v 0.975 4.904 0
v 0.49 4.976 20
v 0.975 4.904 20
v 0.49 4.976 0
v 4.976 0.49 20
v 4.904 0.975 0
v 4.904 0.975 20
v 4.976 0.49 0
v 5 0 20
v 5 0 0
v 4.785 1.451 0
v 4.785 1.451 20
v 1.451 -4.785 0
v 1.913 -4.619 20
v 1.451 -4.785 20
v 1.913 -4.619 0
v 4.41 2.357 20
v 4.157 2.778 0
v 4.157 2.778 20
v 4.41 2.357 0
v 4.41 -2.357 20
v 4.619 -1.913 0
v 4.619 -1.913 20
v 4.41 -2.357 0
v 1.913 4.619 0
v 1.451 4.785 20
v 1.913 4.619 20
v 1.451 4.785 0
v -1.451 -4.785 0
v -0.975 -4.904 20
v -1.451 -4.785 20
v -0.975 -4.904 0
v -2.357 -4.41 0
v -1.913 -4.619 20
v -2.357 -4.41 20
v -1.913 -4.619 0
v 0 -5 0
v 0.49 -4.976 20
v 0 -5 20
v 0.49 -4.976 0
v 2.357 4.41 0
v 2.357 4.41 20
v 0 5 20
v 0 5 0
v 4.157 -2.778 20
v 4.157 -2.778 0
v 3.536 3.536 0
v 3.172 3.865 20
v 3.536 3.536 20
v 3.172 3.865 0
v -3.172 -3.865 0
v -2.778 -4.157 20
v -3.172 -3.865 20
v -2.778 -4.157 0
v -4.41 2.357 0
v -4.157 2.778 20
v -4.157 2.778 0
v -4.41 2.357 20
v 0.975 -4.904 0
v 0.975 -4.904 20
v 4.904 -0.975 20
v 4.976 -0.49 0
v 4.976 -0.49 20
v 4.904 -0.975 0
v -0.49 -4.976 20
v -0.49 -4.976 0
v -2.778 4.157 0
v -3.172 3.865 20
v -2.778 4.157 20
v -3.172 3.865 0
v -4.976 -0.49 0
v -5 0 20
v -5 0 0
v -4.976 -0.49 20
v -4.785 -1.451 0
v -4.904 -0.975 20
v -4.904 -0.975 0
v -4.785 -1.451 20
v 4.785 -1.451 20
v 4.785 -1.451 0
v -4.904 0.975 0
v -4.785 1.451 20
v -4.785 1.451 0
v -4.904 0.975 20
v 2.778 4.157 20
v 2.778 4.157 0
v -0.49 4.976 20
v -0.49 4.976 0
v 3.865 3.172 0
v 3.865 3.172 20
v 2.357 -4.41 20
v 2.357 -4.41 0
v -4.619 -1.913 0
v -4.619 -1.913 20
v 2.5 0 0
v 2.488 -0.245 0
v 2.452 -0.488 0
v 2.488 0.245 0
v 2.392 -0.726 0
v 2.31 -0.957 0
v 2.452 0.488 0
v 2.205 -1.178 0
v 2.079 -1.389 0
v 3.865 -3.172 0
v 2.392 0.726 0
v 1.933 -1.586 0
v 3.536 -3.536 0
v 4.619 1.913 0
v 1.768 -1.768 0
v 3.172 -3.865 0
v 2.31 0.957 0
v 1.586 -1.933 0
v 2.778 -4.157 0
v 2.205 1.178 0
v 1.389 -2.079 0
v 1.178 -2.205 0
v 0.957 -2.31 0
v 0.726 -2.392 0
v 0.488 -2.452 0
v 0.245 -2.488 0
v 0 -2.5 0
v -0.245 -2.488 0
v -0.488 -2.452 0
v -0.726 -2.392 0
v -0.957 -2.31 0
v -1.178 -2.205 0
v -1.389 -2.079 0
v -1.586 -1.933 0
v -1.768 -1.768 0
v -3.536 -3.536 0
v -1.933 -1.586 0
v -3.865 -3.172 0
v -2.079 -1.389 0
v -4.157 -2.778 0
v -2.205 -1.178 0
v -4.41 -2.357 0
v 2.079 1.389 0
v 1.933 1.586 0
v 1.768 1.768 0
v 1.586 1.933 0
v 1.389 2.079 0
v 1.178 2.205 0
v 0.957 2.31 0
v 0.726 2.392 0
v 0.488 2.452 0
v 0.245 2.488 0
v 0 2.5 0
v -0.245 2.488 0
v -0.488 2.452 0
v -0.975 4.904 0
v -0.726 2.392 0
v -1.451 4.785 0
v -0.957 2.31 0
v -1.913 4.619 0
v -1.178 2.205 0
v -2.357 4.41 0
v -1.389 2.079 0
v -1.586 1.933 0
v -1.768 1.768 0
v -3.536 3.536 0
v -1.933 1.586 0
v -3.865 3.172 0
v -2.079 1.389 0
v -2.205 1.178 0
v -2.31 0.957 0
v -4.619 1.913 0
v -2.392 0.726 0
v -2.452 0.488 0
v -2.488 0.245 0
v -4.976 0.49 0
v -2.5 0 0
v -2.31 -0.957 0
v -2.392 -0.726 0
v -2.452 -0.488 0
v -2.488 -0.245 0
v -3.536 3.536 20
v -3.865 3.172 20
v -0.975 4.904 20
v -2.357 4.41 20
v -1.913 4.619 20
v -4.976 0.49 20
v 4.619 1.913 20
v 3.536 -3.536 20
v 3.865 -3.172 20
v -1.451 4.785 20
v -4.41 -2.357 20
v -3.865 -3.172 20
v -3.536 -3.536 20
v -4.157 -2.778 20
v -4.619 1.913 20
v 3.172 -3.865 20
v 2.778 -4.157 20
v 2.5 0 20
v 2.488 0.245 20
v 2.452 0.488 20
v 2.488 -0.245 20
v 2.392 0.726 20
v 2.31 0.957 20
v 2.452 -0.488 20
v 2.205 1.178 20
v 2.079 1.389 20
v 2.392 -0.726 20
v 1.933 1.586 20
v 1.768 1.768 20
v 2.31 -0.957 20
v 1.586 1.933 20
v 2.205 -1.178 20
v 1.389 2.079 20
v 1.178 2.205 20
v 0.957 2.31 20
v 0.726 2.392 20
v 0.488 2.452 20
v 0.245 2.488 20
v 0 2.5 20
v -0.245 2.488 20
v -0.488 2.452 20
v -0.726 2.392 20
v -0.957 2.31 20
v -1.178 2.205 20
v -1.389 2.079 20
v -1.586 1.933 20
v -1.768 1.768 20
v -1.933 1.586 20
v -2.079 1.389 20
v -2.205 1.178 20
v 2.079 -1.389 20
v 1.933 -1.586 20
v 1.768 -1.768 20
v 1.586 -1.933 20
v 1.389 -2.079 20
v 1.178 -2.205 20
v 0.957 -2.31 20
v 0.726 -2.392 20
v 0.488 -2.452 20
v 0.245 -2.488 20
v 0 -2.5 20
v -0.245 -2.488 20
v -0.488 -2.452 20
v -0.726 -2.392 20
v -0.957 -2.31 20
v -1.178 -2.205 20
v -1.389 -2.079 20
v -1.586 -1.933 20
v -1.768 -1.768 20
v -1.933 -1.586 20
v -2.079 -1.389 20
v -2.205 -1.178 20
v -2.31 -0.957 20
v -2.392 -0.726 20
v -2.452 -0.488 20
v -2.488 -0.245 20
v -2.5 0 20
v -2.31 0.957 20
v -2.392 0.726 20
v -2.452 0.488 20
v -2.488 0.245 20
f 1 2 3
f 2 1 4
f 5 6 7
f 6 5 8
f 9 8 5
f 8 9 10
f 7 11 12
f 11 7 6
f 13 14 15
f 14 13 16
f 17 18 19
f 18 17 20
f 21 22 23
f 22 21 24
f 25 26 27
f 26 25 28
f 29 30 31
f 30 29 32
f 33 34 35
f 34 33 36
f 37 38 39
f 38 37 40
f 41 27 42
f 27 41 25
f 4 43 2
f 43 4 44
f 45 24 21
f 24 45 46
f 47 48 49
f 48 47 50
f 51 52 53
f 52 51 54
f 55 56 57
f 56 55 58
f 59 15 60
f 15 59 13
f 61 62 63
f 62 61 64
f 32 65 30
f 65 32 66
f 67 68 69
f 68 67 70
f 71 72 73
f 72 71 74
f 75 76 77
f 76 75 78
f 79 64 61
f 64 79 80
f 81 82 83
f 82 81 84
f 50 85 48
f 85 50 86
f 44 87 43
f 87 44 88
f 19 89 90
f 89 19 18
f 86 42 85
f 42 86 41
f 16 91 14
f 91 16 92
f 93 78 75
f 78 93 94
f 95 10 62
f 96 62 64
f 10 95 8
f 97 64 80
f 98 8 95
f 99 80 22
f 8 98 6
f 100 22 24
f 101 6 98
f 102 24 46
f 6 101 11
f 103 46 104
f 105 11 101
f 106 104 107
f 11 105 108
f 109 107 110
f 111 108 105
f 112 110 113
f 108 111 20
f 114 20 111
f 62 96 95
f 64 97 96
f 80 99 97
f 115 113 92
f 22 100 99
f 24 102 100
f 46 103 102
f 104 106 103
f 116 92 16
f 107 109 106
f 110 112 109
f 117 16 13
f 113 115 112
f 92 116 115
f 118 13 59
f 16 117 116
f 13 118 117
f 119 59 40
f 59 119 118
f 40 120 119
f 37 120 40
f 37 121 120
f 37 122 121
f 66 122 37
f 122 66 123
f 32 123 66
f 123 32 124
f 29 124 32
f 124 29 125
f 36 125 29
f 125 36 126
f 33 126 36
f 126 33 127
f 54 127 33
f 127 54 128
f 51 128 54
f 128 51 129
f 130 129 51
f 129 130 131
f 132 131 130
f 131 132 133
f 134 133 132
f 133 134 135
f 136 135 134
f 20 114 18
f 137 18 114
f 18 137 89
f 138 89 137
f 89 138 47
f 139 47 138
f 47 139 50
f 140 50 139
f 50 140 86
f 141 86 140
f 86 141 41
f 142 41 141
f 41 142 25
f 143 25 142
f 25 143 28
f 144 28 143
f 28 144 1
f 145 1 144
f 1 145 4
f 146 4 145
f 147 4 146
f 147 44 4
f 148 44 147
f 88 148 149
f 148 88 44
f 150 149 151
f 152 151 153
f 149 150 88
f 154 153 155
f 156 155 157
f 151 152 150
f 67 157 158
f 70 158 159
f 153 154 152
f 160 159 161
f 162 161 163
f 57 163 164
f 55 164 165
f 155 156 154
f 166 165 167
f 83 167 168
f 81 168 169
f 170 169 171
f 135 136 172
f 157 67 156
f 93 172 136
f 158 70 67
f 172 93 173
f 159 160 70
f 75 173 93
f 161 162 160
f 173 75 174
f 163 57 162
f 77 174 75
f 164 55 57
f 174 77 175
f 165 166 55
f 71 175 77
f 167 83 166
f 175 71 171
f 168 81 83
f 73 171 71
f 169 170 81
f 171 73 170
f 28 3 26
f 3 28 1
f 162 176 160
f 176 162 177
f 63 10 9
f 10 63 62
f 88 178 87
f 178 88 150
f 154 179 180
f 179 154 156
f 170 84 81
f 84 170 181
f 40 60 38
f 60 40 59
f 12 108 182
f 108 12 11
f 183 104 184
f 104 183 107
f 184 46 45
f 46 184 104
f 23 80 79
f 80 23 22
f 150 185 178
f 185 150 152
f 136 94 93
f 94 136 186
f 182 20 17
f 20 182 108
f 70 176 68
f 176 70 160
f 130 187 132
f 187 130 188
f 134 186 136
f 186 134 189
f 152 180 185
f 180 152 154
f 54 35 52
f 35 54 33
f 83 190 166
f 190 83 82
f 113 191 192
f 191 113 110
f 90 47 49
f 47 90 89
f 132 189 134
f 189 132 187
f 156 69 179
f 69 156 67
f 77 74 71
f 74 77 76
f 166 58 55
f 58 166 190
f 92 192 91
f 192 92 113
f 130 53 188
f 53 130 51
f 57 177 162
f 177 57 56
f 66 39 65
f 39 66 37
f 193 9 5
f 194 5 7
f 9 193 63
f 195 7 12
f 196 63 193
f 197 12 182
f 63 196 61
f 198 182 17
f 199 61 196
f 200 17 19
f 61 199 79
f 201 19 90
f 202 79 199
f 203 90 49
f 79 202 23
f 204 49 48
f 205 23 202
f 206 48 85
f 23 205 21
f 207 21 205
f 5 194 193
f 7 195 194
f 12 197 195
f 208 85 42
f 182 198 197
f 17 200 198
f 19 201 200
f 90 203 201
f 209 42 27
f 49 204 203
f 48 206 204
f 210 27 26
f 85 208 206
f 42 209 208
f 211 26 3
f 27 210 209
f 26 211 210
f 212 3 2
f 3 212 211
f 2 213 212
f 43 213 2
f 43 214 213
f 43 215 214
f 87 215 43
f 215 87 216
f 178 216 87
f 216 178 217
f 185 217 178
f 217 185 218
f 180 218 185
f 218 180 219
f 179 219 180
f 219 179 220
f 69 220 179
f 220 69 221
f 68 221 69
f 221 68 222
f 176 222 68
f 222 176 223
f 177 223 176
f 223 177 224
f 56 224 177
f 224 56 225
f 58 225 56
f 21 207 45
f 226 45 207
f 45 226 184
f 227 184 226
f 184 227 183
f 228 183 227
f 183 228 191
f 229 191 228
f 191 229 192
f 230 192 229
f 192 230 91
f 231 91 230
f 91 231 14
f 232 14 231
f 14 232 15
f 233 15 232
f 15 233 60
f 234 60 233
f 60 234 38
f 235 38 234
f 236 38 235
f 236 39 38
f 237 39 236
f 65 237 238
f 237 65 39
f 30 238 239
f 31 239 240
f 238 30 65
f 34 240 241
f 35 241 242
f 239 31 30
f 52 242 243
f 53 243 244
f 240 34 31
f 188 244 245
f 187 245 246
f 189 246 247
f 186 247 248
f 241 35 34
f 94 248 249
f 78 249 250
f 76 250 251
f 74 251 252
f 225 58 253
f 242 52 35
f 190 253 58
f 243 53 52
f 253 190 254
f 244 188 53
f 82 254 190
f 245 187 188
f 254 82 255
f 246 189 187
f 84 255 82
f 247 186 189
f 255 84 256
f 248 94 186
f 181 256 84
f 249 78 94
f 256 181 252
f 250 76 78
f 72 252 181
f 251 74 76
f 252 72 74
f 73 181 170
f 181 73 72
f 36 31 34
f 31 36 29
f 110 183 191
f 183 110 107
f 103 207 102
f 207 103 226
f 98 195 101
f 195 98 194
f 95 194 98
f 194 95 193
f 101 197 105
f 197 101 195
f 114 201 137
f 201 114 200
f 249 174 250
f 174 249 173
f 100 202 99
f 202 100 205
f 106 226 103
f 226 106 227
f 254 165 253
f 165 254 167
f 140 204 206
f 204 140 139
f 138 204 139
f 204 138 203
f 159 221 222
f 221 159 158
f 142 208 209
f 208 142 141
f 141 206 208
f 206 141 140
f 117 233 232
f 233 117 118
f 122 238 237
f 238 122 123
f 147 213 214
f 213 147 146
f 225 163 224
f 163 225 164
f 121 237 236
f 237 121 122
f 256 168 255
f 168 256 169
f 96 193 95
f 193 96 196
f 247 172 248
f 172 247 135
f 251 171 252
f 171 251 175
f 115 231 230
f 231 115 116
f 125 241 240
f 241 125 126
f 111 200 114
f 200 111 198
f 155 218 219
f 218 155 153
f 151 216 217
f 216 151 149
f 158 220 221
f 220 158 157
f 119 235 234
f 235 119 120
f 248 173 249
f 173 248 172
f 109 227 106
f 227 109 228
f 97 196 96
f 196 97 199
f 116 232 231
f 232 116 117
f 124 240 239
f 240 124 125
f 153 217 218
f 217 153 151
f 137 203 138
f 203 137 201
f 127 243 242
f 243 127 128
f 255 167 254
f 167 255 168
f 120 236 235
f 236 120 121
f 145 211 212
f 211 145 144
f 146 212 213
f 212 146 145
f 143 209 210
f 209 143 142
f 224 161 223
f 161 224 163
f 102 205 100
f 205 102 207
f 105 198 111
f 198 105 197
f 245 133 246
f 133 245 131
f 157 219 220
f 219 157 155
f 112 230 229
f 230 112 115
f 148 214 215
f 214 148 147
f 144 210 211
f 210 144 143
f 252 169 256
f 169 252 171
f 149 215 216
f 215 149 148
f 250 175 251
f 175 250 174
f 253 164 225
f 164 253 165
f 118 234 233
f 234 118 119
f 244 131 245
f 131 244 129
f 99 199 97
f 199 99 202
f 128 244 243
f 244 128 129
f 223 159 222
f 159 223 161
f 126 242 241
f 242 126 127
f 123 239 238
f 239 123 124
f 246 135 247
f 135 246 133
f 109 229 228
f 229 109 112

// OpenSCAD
// M6×20 round sleeve (coupling sleeve)
// OD: 10mm, length: 20mm, M6 through thread

od  = 10.0;
len = 20.0;

$fn = 64;

// Origin at bottom face; extends upward.
module coupling_nut() {
    difference() {
        cylinder(h = len, d = od);
        translate([0, 0, -0.1])
            cylinder(h = len + 0.2, d = 5.0);
    }
}

coupling_nut();
